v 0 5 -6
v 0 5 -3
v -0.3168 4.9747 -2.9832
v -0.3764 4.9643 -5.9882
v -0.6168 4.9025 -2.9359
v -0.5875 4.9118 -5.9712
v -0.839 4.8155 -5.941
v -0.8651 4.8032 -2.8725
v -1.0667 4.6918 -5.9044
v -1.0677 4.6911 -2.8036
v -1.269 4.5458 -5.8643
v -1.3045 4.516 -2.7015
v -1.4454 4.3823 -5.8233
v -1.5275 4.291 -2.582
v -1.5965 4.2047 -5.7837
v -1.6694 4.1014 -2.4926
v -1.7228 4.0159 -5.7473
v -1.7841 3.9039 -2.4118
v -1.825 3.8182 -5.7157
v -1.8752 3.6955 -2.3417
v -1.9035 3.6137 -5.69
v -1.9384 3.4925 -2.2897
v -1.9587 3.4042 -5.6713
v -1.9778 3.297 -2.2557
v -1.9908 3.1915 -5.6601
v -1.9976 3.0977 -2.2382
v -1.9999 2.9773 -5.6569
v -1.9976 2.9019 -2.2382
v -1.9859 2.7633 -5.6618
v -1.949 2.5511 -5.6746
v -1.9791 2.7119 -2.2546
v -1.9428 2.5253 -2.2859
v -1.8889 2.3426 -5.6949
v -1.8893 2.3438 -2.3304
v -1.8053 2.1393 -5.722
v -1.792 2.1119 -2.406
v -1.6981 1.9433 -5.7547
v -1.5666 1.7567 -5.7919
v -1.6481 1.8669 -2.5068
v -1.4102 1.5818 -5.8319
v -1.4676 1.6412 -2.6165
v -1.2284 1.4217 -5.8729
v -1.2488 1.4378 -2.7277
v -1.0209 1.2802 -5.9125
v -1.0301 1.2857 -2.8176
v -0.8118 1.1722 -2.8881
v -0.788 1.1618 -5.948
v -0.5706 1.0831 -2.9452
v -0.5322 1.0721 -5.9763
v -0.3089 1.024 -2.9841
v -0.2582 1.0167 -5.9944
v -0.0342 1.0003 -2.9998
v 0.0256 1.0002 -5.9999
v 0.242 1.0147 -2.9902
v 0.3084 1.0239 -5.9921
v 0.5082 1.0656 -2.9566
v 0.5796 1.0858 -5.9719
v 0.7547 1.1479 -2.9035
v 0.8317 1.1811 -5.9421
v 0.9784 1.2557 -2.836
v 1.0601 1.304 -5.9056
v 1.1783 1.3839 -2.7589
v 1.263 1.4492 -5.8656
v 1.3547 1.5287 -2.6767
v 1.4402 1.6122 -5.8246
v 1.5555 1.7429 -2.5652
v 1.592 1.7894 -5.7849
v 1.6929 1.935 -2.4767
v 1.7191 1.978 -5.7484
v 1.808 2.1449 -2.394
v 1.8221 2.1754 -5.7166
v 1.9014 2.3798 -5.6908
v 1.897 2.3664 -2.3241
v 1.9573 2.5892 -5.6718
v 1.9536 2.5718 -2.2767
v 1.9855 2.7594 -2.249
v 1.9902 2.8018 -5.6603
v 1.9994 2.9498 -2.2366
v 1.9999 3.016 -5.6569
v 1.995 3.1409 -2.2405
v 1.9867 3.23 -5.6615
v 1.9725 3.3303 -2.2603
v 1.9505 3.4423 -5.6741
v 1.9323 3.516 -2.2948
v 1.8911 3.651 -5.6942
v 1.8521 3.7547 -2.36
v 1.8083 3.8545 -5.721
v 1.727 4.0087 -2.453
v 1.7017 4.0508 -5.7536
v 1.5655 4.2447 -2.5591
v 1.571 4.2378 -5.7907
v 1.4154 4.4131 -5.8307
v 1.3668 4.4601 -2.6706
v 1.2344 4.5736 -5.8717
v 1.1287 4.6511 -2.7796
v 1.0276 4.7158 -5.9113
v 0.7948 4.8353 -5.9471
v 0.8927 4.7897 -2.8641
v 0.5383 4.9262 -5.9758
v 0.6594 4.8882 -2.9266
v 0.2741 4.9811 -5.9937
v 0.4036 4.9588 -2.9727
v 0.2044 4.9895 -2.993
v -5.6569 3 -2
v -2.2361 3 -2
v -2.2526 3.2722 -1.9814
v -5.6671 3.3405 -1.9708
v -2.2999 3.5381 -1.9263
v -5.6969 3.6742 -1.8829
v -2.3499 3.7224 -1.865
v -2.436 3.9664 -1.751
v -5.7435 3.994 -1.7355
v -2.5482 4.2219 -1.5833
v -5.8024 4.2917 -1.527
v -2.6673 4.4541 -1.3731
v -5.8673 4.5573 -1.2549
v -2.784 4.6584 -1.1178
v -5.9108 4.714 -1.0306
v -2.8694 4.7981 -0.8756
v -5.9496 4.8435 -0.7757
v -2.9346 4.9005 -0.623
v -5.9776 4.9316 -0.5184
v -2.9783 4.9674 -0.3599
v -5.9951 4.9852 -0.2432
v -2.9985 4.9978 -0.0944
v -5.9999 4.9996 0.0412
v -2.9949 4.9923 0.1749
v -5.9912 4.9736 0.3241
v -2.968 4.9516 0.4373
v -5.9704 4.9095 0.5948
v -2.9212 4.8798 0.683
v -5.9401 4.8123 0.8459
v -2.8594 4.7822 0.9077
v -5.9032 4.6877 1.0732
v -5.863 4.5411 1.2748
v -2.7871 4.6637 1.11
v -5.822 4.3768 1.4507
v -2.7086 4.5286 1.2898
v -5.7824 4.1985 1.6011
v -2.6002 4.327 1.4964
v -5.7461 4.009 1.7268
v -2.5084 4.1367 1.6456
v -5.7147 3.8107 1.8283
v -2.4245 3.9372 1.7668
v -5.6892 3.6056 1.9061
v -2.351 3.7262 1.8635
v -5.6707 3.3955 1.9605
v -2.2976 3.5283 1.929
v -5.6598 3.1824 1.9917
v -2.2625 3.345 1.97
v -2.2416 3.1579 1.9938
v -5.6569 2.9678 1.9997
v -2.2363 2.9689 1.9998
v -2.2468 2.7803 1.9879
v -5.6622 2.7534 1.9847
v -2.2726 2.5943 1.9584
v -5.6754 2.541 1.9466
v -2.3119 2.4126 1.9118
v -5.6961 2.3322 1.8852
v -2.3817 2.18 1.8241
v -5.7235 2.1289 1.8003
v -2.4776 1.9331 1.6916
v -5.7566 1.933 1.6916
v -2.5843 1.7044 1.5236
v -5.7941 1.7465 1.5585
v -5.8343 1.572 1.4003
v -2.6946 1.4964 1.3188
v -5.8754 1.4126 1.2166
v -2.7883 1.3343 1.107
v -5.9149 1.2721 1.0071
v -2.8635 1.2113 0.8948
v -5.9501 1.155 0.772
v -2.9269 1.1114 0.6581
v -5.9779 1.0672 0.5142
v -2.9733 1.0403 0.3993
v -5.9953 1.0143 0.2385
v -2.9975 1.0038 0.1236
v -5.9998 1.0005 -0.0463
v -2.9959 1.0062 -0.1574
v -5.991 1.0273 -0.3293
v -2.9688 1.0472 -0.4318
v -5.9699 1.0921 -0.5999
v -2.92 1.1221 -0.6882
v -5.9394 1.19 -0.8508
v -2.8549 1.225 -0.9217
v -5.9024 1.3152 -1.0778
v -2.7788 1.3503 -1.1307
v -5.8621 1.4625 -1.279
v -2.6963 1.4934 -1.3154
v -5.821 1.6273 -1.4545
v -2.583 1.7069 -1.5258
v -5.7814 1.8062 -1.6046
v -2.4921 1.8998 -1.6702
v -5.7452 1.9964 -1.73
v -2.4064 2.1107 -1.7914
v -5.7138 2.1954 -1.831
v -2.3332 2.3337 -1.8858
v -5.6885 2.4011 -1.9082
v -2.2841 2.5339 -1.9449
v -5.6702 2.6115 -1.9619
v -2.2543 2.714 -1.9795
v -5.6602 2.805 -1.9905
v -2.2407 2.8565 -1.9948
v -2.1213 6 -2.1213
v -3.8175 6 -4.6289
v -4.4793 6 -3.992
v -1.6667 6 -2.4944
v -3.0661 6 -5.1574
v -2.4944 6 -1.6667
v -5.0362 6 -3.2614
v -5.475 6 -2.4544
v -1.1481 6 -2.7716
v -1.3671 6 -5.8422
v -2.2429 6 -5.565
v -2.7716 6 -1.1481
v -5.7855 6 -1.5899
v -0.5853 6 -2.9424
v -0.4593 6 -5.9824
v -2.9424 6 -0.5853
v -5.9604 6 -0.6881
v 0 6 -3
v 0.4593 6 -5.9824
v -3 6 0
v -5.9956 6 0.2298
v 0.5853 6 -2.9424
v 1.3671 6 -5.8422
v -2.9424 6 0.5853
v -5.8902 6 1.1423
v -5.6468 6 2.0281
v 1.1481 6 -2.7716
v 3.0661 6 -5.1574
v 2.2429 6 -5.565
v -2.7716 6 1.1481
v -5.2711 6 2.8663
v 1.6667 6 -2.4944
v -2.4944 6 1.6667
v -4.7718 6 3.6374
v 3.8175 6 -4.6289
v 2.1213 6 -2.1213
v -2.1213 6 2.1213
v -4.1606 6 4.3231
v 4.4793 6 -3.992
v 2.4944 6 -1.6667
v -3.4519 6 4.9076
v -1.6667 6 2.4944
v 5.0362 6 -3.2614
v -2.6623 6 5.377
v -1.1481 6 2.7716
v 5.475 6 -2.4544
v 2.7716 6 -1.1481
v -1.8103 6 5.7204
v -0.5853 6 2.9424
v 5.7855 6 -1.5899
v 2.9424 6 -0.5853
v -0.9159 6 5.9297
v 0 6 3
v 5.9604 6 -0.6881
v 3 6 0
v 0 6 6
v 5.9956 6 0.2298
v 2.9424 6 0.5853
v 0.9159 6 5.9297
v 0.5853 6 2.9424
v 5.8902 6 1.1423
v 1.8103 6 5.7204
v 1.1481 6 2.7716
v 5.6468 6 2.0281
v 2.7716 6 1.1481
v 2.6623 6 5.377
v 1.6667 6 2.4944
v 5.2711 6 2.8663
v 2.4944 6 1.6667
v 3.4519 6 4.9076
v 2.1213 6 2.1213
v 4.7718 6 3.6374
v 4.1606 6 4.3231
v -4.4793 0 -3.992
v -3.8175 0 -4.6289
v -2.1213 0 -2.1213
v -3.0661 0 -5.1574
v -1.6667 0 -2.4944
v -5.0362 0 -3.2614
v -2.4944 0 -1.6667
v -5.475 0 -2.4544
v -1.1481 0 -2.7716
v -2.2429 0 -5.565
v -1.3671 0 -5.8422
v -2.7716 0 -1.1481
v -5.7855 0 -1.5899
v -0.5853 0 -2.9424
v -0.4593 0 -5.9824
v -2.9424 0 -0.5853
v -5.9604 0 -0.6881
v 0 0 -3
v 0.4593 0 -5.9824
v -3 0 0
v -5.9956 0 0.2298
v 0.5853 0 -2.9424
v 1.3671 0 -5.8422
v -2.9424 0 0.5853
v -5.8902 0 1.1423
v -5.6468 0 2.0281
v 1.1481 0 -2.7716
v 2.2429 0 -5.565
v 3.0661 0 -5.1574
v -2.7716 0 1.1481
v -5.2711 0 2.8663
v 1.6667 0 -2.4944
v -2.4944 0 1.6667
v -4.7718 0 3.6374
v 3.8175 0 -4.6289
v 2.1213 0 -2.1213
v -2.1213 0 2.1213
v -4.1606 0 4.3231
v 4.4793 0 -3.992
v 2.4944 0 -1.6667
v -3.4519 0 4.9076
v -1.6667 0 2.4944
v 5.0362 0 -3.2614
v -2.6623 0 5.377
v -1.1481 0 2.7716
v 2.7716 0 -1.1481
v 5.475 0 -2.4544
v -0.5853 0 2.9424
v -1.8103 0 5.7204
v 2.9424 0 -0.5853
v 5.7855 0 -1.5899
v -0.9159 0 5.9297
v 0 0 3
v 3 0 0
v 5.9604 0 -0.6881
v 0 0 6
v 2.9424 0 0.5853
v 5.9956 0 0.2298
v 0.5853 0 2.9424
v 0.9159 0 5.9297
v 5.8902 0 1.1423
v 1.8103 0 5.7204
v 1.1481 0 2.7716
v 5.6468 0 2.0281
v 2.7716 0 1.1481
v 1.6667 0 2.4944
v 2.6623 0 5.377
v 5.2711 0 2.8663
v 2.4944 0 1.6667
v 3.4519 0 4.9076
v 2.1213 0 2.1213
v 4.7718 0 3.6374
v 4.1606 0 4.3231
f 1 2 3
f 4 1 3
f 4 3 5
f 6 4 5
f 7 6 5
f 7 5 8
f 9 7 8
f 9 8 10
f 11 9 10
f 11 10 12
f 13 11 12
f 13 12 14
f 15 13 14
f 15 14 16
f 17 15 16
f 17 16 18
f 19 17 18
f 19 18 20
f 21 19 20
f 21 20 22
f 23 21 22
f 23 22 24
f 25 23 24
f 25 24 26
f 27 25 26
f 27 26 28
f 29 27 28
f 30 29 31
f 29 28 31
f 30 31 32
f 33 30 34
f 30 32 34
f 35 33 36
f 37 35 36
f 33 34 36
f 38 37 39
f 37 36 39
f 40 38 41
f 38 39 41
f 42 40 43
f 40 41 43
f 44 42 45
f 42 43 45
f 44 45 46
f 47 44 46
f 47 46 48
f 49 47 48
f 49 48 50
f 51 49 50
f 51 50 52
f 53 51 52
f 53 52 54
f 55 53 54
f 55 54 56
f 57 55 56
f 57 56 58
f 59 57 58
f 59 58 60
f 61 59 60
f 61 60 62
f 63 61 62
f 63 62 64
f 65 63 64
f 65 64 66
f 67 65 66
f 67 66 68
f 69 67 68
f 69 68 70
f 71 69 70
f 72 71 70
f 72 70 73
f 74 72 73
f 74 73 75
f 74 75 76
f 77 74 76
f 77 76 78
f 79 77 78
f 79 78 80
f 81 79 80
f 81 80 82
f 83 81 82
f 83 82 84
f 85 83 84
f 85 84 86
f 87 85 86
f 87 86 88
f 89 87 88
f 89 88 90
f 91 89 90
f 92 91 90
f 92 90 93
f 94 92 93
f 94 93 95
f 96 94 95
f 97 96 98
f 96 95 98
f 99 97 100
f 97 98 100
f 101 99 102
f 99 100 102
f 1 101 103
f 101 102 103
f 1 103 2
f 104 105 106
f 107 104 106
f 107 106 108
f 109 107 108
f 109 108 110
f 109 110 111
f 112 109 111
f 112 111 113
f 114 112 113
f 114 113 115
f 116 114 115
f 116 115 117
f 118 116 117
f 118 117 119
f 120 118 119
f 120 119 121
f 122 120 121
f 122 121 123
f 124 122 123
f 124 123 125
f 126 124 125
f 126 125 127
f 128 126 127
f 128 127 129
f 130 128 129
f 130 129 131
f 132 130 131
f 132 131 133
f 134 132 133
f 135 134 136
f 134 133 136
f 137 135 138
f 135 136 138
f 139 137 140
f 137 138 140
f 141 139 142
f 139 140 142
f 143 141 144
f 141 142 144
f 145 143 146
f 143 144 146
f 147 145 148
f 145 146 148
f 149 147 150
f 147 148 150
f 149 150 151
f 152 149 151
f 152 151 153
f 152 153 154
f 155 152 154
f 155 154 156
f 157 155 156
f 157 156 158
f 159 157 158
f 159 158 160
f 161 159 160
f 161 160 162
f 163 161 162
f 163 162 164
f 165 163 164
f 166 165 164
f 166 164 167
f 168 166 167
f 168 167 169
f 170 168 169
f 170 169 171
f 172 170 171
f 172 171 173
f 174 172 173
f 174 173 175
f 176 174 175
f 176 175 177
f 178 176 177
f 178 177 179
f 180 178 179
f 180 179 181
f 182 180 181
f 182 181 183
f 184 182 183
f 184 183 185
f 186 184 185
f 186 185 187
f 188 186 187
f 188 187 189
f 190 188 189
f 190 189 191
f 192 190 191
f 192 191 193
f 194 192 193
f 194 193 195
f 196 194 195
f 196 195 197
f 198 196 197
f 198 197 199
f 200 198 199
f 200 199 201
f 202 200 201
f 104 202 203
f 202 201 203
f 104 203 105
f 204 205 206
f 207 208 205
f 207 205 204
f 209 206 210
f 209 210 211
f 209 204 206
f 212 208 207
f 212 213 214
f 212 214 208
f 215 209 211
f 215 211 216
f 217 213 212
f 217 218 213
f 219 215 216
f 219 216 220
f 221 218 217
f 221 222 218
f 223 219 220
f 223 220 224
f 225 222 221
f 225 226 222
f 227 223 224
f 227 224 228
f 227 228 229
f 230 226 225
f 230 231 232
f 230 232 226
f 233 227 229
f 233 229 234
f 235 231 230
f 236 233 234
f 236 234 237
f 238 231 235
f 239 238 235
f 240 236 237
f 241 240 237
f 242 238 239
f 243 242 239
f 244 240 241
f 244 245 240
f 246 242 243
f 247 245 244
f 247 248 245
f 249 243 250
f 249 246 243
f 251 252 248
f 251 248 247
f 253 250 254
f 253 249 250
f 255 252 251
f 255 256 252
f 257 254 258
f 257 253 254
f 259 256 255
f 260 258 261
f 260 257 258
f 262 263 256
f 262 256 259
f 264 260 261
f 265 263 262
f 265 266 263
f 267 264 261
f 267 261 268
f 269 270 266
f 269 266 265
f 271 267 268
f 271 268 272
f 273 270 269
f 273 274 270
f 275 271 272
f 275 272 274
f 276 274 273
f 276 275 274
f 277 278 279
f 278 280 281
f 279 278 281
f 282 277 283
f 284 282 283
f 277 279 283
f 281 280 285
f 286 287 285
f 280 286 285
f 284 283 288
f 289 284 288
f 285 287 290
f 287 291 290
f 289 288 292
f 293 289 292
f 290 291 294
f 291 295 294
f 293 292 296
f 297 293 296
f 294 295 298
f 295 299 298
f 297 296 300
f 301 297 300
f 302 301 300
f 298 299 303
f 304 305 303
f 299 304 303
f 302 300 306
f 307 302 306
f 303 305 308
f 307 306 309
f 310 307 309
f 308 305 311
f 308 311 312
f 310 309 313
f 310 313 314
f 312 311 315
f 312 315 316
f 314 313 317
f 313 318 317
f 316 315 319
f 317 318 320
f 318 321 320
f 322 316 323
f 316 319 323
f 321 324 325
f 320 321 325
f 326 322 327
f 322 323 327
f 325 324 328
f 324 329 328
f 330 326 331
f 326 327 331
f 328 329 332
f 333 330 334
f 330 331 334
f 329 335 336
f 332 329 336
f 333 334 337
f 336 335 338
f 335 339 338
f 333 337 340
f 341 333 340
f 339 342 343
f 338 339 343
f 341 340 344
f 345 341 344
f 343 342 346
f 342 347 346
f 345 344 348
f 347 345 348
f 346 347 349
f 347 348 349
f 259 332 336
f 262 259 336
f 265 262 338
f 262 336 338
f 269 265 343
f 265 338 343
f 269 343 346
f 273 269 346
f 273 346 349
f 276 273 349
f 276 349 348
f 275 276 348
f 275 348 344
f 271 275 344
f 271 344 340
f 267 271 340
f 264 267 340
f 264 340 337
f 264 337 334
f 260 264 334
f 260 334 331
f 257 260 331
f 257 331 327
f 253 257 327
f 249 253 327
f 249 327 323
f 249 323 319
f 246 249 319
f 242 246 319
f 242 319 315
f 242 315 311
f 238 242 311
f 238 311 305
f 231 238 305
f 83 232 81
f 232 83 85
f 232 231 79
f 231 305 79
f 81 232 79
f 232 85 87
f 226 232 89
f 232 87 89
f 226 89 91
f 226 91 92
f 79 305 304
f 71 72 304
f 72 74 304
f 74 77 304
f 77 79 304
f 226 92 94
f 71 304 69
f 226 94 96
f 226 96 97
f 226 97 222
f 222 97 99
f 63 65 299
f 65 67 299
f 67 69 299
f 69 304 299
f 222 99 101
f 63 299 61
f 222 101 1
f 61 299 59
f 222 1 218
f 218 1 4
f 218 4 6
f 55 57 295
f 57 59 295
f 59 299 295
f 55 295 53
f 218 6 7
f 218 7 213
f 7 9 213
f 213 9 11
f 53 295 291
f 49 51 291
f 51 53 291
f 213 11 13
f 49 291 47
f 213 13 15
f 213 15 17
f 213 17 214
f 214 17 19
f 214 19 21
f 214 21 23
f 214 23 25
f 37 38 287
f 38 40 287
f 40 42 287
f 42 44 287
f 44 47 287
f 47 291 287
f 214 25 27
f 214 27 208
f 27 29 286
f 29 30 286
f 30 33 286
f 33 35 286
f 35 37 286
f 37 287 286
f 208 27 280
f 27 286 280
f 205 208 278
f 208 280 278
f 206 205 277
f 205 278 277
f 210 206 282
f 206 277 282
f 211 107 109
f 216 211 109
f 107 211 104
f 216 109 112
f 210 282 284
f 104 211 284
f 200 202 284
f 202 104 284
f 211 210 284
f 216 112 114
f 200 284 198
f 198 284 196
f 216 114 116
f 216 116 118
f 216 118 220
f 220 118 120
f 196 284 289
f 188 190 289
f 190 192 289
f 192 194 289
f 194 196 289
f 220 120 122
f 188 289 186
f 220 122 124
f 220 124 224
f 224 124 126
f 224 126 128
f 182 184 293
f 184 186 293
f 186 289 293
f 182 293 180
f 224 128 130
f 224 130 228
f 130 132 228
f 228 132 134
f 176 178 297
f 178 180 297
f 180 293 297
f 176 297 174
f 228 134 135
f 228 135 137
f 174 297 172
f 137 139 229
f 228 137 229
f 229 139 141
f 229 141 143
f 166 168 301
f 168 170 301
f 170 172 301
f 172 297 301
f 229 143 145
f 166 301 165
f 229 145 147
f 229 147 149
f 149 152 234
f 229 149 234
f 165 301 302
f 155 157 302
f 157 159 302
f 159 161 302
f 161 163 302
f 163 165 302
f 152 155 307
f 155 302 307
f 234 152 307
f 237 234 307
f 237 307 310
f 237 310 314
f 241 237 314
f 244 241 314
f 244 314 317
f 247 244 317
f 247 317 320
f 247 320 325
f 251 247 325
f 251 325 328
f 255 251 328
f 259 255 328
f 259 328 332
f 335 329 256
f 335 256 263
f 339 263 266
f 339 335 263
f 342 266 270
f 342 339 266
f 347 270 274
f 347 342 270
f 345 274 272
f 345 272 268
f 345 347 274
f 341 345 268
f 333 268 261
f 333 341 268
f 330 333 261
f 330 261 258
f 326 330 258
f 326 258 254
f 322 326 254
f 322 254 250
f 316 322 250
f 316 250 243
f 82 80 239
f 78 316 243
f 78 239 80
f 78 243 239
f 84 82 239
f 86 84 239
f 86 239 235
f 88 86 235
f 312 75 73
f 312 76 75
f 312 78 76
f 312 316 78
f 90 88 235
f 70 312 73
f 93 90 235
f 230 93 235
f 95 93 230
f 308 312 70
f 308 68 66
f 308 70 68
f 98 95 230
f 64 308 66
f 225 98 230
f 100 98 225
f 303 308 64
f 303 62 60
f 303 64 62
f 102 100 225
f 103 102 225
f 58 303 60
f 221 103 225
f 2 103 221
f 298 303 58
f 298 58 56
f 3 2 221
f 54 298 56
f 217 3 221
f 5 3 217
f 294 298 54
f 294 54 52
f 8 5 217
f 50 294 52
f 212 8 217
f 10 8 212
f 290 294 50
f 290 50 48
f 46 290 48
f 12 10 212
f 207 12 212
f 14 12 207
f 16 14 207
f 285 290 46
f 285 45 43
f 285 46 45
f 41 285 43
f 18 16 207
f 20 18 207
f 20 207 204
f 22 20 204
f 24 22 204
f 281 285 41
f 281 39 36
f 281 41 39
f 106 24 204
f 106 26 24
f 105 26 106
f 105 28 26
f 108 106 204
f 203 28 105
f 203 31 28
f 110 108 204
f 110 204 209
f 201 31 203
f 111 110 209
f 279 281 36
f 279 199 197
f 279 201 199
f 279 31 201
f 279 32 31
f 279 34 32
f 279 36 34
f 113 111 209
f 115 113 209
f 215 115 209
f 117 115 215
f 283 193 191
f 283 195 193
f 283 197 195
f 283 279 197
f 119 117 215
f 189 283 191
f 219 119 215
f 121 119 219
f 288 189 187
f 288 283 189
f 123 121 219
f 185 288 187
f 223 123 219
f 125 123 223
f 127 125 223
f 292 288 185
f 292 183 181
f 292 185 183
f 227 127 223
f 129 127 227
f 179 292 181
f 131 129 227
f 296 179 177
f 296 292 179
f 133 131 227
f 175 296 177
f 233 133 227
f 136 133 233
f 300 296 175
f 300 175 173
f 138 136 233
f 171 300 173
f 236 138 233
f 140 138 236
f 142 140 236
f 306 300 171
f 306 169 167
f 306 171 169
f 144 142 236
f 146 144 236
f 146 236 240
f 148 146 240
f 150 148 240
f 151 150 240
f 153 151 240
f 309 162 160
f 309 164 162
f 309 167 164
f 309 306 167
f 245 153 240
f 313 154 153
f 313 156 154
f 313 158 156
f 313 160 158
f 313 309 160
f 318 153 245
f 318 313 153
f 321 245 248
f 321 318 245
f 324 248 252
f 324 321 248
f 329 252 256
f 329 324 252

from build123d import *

# Parameters (mm, degrees)
SKETCH_1_R          = 6
SKETCH_1_R_2        = 3
EXTRUDE_1_DEPTH     = 6
SKETCH_2_R          = 2
CUT_EXTRUDE_1_DEPTH = 10
SKETCH_3_R          = 2
CUT_EXTRUDE_2_DEPTH = 10


with BuildPart() as part:
    # 草图1 → 凸台-拉伸1 (new body)
    with BuildSketch(Plane(origin=(0, 0, 0), x_dir=(1, 0, 0), z_dir=(0, 1, 0))):
        with Locations(Location((0, 0, 0), (0, 0, 270))):
            Circle(SKETCH_1_R)
        with Locations(Location((0, 0, 0), (0, 0, 270))):
            Circle(SKETCH_1_R_2, mode=Mode.SUBTRACT)
    extrude(amount=EXTRUDE_1_DEPTH)

    # 草图2 → 切除-拉伸1 (cut)
    with BuildSketch(Plane.XY):
        with Locations(Location((0, 3, 0), (0, 0, 90))):
            Circle(SKETCH_2_R)
    extrude(amount=-CUT_EXTRUDE_1_DEPTH, mode=Mode.SUBTRACT)

    # 草图3 → 切除-拉伸2 (cut)
    with BuildSketch(Plane(origin=(0, 0, 0), x_dir=(0, 0, -1), z_dir=(1, 0, 0))):
        with Locations((0, 3)):
            Circle(SKETCH_3_R)
    extrude(amount=-CUT_EXTRUDE_2_DEPTH, mode=Mode.SUBTRACT)


solid = part.part
